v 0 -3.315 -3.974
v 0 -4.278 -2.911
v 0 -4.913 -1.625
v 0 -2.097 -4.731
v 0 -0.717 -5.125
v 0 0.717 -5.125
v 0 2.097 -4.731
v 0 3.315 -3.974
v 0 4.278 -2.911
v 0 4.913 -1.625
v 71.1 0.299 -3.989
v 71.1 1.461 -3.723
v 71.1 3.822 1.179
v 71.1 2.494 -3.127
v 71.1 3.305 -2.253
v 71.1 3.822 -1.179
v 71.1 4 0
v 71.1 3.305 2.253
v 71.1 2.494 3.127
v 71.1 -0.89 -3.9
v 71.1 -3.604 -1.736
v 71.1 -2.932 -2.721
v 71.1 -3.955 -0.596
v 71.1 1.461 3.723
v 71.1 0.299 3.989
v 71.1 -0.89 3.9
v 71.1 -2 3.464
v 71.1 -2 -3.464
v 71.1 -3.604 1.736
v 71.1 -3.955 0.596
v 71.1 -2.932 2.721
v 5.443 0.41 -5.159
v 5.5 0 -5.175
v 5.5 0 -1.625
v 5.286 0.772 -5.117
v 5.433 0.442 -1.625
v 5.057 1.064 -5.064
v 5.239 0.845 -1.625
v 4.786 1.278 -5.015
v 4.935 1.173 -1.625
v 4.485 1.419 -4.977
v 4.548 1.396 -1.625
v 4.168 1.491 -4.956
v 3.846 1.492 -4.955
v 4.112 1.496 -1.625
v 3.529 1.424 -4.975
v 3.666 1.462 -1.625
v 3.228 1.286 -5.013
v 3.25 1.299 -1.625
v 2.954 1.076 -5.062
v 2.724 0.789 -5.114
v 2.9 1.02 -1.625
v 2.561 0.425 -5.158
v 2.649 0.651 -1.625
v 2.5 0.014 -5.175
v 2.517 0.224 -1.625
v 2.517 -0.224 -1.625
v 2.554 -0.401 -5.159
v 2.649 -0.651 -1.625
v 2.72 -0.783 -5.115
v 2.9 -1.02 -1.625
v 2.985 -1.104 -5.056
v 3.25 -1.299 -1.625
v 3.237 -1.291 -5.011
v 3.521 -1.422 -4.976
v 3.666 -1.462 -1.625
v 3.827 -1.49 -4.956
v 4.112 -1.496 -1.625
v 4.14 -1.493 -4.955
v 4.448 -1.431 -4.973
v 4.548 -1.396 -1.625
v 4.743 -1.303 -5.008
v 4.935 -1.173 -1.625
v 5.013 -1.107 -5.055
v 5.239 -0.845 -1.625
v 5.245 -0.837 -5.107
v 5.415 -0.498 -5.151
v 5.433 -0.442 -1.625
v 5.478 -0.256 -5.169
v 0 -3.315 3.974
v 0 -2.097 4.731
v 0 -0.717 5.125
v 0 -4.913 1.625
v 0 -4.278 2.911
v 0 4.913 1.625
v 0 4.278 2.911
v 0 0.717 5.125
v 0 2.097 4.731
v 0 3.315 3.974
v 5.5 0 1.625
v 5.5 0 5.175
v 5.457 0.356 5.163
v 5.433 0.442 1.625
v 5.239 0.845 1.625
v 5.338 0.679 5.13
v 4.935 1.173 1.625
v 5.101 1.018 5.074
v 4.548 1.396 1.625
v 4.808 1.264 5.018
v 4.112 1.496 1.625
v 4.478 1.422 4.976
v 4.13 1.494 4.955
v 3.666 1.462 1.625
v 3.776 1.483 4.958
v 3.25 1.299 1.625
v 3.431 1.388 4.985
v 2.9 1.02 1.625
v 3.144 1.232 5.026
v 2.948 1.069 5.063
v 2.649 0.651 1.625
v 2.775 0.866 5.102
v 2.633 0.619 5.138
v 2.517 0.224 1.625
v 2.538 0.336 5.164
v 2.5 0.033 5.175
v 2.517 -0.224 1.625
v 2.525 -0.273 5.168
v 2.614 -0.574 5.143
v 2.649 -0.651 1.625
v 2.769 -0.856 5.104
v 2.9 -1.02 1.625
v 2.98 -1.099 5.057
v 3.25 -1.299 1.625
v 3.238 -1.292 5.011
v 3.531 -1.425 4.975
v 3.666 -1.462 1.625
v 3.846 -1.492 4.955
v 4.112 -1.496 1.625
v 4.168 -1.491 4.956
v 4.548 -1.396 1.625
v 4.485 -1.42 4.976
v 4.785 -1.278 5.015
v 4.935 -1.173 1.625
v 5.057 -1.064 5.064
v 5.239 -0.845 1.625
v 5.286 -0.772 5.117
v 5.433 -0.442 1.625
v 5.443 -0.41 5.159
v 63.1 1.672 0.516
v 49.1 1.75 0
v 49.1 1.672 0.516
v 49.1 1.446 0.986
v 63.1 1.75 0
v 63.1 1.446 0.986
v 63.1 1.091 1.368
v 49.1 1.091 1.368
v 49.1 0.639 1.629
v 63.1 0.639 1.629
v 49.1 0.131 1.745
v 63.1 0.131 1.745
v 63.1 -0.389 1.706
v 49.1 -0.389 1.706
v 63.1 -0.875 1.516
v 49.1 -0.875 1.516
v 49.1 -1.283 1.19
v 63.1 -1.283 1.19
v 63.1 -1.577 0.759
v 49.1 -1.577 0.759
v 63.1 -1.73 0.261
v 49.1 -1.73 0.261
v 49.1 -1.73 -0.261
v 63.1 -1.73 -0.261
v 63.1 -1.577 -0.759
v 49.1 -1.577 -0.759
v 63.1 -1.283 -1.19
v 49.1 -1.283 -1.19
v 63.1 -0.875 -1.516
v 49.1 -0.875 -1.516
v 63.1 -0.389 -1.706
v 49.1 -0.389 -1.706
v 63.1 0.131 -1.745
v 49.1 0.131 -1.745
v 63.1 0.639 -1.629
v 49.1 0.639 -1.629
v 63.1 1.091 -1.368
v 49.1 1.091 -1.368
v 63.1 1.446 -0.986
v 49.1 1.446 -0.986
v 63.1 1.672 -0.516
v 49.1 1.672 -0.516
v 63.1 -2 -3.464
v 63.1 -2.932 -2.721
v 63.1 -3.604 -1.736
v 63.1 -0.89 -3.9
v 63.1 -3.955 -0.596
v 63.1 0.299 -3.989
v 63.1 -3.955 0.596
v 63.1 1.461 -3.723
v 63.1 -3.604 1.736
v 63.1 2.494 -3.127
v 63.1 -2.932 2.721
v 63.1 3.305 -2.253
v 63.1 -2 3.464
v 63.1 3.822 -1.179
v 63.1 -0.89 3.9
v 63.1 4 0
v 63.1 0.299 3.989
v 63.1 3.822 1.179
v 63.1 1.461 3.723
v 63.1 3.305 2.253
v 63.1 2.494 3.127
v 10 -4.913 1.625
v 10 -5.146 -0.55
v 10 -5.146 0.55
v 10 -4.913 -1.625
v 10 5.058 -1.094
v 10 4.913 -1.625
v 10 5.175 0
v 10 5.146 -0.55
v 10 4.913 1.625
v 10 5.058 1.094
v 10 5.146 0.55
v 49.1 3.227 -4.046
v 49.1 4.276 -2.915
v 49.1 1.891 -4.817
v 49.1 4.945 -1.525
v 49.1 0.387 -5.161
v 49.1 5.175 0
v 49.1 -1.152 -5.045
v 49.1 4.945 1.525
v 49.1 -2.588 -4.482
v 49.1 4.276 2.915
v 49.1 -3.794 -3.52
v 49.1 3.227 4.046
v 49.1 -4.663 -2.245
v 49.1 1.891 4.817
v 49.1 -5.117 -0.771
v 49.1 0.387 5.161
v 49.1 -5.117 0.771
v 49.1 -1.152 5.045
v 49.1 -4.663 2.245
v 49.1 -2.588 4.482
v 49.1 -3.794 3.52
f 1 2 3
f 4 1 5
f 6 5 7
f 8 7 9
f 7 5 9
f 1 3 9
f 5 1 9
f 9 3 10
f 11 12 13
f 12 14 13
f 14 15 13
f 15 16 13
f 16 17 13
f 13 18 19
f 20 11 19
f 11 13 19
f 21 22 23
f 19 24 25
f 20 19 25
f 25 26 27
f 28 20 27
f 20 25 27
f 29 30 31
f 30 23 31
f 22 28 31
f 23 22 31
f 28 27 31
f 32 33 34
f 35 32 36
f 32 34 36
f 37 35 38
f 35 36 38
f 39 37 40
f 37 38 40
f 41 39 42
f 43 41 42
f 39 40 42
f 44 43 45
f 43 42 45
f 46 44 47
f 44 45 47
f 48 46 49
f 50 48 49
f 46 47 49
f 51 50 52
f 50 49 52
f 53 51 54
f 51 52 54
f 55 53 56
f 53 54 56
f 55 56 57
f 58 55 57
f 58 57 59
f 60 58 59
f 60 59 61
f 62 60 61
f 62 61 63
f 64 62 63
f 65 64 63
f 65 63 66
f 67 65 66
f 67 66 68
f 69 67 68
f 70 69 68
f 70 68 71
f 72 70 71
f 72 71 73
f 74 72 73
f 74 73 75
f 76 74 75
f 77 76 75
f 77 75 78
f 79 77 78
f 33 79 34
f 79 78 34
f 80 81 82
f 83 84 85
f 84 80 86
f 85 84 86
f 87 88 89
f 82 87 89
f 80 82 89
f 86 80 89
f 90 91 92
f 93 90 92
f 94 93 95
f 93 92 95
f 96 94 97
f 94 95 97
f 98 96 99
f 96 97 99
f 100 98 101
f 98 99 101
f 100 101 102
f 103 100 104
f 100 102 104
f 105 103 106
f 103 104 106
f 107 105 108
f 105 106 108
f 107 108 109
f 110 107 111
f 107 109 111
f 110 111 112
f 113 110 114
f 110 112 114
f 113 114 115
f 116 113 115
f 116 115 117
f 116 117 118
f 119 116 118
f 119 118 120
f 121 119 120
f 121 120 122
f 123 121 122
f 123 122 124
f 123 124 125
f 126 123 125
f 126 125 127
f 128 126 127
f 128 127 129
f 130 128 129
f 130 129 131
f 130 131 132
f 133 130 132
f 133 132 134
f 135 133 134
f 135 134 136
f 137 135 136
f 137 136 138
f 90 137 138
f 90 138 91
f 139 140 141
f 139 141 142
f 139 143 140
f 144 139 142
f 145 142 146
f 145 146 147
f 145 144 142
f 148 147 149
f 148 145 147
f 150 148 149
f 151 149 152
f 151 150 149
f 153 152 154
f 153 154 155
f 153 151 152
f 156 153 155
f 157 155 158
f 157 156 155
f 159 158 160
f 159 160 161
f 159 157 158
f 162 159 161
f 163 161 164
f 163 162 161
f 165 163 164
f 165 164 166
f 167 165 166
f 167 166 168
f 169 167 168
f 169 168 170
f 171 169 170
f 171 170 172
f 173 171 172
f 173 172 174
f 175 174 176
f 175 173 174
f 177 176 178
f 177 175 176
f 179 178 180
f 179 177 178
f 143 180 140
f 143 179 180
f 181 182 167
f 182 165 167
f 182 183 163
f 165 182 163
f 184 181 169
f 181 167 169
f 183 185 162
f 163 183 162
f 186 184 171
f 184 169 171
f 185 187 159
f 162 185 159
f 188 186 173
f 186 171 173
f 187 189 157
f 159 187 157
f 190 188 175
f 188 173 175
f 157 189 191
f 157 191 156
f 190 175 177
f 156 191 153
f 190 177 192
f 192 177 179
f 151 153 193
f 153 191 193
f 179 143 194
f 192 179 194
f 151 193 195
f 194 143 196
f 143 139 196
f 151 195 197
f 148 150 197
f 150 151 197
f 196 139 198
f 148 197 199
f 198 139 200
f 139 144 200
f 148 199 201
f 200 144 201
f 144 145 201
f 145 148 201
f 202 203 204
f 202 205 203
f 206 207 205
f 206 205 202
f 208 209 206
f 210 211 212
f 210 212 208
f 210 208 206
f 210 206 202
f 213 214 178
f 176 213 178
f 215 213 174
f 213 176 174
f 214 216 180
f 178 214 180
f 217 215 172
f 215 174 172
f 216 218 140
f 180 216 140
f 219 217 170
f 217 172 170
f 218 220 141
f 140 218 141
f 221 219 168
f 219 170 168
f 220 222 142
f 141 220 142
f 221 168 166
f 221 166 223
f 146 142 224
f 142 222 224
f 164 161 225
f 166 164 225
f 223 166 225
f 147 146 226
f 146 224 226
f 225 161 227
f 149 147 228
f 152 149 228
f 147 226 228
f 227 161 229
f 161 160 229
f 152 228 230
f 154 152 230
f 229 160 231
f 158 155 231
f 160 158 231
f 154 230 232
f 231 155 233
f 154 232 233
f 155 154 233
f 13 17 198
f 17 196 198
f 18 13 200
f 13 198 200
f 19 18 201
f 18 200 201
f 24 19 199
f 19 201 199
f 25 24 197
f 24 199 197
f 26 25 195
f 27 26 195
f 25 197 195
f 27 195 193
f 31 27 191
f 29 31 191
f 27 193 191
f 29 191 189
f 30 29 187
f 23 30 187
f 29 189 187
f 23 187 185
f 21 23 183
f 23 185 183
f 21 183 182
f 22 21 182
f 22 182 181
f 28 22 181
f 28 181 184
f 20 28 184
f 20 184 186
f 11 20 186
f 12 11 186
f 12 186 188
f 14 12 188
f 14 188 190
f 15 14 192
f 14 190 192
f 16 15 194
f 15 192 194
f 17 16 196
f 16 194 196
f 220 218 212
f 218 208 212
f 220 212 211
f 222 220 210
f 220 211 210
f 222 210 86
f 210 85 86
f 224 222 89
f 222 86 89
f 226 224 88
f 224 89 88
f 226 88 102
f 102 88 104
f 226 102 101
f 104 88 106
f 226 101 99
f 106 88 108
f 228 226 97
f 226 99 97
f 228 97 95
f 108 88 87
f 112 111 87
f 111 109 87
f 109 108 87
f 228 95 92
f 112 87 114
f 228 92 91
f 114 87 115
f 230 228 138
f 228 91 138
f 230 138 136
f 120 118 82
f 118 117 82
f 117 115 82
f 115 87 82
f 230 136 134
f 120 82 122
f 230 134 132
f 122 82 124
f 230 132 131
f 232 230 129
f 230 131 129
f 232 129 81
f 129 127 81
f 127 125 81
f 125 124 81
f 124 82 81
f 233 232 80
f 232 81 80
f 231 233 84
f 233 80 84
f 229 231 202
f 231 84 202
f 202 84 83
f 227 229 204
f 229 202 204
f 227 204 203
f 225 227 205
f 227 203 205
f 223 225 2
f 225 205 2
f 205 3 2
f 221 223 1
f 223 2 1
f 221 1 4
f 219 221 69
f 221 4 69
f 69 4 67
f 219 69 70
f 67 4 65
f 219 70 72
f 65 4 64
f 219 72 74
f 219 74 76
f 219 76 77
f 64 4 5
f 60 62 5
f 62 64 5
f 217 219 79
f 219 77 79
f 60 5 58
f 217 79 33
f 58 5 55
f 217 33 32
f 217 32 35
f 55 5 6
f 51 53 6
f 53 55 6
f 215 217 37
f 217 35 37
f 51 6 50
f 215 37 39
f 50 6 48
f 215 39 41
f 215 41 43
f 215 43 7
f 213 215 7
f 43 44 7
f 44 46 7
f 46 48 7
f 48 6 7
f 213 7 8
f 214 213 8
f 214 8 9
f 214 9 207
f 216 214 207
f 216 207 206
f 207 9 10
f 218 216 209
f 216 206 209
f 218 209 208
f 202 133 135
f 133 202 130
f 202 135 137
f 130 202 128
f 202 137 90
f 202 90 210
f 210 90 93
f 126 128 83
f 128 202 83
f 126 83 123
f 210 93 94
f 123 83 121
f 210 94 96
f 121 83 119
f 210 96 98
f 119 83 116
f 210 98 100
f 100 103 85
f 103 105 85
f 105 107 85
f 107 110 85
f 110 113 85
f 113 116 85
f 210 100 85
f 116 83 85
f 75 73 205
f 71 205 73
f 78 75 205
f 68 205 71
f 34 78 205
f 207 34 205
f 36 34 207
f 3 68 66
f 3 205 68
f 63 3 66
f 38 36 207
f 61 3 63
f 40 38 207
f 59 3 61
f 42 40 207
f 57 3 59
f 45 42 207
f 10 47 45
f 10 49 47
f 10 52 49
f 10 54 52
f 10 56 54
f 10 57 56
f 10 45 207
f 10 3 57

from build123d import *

# Parameters (mm, degrees)
SKETCH1_W          = 14
SKETCH1_H          = 1.75
CUT_EXTRUDE1_REACH = 12.35
SKETCH2_R          = 1.5
SKETCH3_W          = 3.25
SKETCH3_H          = 10.35
CUT_EXTRUDE2_DEPTH = 10


with BuildPart() as part:
    # Sketch1 → Revolve1 (revolve)
    with BuildSketch(Plane.XY):
        Polygon((0, 5.175), (0, 0), (49.1, 0), (49.1, 1.75), (49.1, 5.175), align=None)
        with Locations((56.1, 0.875)):
            Rectangle(SKETCH1_W, SKETCH1_H)
        Polygon((63.1, 1.75), (63.1, 0), (71.1, 0), (71.1, 4), (63.1, 4), align=None)
    revolve(axis=Axis((0, 0, 0), (1, 0, 0)))

    # Sketch2 → Cut-Extrude1 (cut, up to next)
    with BuildSketch(Plane.XY.offset(5.175), mode=Mode.PRIVATE) as cut_extrude1_sk1:
        with Locations((4, 0)):
            Circle(SKETCH2_R)
    cut_extrude1_tool1 = extrude(cut_extrude1_sk1.sketch, amount=-CUT_EXTRUDE1_REACH, mode=Mode.PRIVATE) & part.part
    add(cut_extrude1_tool1.solids().sort_by_distance((4, 0, 5.175))[0], mode=Mode.SUBTRACT)

    # Sketch3 → Cut-Extrude2 (cut)
    with BuildSketch(Plane.ZY):
        Rectangle(SKETCH3_W, SKETCH3_H)
    extrude(amount=-CUT_EXTRUDE2_DEPTH, mode=Mode.SUBTRACT)


solid = part.part
